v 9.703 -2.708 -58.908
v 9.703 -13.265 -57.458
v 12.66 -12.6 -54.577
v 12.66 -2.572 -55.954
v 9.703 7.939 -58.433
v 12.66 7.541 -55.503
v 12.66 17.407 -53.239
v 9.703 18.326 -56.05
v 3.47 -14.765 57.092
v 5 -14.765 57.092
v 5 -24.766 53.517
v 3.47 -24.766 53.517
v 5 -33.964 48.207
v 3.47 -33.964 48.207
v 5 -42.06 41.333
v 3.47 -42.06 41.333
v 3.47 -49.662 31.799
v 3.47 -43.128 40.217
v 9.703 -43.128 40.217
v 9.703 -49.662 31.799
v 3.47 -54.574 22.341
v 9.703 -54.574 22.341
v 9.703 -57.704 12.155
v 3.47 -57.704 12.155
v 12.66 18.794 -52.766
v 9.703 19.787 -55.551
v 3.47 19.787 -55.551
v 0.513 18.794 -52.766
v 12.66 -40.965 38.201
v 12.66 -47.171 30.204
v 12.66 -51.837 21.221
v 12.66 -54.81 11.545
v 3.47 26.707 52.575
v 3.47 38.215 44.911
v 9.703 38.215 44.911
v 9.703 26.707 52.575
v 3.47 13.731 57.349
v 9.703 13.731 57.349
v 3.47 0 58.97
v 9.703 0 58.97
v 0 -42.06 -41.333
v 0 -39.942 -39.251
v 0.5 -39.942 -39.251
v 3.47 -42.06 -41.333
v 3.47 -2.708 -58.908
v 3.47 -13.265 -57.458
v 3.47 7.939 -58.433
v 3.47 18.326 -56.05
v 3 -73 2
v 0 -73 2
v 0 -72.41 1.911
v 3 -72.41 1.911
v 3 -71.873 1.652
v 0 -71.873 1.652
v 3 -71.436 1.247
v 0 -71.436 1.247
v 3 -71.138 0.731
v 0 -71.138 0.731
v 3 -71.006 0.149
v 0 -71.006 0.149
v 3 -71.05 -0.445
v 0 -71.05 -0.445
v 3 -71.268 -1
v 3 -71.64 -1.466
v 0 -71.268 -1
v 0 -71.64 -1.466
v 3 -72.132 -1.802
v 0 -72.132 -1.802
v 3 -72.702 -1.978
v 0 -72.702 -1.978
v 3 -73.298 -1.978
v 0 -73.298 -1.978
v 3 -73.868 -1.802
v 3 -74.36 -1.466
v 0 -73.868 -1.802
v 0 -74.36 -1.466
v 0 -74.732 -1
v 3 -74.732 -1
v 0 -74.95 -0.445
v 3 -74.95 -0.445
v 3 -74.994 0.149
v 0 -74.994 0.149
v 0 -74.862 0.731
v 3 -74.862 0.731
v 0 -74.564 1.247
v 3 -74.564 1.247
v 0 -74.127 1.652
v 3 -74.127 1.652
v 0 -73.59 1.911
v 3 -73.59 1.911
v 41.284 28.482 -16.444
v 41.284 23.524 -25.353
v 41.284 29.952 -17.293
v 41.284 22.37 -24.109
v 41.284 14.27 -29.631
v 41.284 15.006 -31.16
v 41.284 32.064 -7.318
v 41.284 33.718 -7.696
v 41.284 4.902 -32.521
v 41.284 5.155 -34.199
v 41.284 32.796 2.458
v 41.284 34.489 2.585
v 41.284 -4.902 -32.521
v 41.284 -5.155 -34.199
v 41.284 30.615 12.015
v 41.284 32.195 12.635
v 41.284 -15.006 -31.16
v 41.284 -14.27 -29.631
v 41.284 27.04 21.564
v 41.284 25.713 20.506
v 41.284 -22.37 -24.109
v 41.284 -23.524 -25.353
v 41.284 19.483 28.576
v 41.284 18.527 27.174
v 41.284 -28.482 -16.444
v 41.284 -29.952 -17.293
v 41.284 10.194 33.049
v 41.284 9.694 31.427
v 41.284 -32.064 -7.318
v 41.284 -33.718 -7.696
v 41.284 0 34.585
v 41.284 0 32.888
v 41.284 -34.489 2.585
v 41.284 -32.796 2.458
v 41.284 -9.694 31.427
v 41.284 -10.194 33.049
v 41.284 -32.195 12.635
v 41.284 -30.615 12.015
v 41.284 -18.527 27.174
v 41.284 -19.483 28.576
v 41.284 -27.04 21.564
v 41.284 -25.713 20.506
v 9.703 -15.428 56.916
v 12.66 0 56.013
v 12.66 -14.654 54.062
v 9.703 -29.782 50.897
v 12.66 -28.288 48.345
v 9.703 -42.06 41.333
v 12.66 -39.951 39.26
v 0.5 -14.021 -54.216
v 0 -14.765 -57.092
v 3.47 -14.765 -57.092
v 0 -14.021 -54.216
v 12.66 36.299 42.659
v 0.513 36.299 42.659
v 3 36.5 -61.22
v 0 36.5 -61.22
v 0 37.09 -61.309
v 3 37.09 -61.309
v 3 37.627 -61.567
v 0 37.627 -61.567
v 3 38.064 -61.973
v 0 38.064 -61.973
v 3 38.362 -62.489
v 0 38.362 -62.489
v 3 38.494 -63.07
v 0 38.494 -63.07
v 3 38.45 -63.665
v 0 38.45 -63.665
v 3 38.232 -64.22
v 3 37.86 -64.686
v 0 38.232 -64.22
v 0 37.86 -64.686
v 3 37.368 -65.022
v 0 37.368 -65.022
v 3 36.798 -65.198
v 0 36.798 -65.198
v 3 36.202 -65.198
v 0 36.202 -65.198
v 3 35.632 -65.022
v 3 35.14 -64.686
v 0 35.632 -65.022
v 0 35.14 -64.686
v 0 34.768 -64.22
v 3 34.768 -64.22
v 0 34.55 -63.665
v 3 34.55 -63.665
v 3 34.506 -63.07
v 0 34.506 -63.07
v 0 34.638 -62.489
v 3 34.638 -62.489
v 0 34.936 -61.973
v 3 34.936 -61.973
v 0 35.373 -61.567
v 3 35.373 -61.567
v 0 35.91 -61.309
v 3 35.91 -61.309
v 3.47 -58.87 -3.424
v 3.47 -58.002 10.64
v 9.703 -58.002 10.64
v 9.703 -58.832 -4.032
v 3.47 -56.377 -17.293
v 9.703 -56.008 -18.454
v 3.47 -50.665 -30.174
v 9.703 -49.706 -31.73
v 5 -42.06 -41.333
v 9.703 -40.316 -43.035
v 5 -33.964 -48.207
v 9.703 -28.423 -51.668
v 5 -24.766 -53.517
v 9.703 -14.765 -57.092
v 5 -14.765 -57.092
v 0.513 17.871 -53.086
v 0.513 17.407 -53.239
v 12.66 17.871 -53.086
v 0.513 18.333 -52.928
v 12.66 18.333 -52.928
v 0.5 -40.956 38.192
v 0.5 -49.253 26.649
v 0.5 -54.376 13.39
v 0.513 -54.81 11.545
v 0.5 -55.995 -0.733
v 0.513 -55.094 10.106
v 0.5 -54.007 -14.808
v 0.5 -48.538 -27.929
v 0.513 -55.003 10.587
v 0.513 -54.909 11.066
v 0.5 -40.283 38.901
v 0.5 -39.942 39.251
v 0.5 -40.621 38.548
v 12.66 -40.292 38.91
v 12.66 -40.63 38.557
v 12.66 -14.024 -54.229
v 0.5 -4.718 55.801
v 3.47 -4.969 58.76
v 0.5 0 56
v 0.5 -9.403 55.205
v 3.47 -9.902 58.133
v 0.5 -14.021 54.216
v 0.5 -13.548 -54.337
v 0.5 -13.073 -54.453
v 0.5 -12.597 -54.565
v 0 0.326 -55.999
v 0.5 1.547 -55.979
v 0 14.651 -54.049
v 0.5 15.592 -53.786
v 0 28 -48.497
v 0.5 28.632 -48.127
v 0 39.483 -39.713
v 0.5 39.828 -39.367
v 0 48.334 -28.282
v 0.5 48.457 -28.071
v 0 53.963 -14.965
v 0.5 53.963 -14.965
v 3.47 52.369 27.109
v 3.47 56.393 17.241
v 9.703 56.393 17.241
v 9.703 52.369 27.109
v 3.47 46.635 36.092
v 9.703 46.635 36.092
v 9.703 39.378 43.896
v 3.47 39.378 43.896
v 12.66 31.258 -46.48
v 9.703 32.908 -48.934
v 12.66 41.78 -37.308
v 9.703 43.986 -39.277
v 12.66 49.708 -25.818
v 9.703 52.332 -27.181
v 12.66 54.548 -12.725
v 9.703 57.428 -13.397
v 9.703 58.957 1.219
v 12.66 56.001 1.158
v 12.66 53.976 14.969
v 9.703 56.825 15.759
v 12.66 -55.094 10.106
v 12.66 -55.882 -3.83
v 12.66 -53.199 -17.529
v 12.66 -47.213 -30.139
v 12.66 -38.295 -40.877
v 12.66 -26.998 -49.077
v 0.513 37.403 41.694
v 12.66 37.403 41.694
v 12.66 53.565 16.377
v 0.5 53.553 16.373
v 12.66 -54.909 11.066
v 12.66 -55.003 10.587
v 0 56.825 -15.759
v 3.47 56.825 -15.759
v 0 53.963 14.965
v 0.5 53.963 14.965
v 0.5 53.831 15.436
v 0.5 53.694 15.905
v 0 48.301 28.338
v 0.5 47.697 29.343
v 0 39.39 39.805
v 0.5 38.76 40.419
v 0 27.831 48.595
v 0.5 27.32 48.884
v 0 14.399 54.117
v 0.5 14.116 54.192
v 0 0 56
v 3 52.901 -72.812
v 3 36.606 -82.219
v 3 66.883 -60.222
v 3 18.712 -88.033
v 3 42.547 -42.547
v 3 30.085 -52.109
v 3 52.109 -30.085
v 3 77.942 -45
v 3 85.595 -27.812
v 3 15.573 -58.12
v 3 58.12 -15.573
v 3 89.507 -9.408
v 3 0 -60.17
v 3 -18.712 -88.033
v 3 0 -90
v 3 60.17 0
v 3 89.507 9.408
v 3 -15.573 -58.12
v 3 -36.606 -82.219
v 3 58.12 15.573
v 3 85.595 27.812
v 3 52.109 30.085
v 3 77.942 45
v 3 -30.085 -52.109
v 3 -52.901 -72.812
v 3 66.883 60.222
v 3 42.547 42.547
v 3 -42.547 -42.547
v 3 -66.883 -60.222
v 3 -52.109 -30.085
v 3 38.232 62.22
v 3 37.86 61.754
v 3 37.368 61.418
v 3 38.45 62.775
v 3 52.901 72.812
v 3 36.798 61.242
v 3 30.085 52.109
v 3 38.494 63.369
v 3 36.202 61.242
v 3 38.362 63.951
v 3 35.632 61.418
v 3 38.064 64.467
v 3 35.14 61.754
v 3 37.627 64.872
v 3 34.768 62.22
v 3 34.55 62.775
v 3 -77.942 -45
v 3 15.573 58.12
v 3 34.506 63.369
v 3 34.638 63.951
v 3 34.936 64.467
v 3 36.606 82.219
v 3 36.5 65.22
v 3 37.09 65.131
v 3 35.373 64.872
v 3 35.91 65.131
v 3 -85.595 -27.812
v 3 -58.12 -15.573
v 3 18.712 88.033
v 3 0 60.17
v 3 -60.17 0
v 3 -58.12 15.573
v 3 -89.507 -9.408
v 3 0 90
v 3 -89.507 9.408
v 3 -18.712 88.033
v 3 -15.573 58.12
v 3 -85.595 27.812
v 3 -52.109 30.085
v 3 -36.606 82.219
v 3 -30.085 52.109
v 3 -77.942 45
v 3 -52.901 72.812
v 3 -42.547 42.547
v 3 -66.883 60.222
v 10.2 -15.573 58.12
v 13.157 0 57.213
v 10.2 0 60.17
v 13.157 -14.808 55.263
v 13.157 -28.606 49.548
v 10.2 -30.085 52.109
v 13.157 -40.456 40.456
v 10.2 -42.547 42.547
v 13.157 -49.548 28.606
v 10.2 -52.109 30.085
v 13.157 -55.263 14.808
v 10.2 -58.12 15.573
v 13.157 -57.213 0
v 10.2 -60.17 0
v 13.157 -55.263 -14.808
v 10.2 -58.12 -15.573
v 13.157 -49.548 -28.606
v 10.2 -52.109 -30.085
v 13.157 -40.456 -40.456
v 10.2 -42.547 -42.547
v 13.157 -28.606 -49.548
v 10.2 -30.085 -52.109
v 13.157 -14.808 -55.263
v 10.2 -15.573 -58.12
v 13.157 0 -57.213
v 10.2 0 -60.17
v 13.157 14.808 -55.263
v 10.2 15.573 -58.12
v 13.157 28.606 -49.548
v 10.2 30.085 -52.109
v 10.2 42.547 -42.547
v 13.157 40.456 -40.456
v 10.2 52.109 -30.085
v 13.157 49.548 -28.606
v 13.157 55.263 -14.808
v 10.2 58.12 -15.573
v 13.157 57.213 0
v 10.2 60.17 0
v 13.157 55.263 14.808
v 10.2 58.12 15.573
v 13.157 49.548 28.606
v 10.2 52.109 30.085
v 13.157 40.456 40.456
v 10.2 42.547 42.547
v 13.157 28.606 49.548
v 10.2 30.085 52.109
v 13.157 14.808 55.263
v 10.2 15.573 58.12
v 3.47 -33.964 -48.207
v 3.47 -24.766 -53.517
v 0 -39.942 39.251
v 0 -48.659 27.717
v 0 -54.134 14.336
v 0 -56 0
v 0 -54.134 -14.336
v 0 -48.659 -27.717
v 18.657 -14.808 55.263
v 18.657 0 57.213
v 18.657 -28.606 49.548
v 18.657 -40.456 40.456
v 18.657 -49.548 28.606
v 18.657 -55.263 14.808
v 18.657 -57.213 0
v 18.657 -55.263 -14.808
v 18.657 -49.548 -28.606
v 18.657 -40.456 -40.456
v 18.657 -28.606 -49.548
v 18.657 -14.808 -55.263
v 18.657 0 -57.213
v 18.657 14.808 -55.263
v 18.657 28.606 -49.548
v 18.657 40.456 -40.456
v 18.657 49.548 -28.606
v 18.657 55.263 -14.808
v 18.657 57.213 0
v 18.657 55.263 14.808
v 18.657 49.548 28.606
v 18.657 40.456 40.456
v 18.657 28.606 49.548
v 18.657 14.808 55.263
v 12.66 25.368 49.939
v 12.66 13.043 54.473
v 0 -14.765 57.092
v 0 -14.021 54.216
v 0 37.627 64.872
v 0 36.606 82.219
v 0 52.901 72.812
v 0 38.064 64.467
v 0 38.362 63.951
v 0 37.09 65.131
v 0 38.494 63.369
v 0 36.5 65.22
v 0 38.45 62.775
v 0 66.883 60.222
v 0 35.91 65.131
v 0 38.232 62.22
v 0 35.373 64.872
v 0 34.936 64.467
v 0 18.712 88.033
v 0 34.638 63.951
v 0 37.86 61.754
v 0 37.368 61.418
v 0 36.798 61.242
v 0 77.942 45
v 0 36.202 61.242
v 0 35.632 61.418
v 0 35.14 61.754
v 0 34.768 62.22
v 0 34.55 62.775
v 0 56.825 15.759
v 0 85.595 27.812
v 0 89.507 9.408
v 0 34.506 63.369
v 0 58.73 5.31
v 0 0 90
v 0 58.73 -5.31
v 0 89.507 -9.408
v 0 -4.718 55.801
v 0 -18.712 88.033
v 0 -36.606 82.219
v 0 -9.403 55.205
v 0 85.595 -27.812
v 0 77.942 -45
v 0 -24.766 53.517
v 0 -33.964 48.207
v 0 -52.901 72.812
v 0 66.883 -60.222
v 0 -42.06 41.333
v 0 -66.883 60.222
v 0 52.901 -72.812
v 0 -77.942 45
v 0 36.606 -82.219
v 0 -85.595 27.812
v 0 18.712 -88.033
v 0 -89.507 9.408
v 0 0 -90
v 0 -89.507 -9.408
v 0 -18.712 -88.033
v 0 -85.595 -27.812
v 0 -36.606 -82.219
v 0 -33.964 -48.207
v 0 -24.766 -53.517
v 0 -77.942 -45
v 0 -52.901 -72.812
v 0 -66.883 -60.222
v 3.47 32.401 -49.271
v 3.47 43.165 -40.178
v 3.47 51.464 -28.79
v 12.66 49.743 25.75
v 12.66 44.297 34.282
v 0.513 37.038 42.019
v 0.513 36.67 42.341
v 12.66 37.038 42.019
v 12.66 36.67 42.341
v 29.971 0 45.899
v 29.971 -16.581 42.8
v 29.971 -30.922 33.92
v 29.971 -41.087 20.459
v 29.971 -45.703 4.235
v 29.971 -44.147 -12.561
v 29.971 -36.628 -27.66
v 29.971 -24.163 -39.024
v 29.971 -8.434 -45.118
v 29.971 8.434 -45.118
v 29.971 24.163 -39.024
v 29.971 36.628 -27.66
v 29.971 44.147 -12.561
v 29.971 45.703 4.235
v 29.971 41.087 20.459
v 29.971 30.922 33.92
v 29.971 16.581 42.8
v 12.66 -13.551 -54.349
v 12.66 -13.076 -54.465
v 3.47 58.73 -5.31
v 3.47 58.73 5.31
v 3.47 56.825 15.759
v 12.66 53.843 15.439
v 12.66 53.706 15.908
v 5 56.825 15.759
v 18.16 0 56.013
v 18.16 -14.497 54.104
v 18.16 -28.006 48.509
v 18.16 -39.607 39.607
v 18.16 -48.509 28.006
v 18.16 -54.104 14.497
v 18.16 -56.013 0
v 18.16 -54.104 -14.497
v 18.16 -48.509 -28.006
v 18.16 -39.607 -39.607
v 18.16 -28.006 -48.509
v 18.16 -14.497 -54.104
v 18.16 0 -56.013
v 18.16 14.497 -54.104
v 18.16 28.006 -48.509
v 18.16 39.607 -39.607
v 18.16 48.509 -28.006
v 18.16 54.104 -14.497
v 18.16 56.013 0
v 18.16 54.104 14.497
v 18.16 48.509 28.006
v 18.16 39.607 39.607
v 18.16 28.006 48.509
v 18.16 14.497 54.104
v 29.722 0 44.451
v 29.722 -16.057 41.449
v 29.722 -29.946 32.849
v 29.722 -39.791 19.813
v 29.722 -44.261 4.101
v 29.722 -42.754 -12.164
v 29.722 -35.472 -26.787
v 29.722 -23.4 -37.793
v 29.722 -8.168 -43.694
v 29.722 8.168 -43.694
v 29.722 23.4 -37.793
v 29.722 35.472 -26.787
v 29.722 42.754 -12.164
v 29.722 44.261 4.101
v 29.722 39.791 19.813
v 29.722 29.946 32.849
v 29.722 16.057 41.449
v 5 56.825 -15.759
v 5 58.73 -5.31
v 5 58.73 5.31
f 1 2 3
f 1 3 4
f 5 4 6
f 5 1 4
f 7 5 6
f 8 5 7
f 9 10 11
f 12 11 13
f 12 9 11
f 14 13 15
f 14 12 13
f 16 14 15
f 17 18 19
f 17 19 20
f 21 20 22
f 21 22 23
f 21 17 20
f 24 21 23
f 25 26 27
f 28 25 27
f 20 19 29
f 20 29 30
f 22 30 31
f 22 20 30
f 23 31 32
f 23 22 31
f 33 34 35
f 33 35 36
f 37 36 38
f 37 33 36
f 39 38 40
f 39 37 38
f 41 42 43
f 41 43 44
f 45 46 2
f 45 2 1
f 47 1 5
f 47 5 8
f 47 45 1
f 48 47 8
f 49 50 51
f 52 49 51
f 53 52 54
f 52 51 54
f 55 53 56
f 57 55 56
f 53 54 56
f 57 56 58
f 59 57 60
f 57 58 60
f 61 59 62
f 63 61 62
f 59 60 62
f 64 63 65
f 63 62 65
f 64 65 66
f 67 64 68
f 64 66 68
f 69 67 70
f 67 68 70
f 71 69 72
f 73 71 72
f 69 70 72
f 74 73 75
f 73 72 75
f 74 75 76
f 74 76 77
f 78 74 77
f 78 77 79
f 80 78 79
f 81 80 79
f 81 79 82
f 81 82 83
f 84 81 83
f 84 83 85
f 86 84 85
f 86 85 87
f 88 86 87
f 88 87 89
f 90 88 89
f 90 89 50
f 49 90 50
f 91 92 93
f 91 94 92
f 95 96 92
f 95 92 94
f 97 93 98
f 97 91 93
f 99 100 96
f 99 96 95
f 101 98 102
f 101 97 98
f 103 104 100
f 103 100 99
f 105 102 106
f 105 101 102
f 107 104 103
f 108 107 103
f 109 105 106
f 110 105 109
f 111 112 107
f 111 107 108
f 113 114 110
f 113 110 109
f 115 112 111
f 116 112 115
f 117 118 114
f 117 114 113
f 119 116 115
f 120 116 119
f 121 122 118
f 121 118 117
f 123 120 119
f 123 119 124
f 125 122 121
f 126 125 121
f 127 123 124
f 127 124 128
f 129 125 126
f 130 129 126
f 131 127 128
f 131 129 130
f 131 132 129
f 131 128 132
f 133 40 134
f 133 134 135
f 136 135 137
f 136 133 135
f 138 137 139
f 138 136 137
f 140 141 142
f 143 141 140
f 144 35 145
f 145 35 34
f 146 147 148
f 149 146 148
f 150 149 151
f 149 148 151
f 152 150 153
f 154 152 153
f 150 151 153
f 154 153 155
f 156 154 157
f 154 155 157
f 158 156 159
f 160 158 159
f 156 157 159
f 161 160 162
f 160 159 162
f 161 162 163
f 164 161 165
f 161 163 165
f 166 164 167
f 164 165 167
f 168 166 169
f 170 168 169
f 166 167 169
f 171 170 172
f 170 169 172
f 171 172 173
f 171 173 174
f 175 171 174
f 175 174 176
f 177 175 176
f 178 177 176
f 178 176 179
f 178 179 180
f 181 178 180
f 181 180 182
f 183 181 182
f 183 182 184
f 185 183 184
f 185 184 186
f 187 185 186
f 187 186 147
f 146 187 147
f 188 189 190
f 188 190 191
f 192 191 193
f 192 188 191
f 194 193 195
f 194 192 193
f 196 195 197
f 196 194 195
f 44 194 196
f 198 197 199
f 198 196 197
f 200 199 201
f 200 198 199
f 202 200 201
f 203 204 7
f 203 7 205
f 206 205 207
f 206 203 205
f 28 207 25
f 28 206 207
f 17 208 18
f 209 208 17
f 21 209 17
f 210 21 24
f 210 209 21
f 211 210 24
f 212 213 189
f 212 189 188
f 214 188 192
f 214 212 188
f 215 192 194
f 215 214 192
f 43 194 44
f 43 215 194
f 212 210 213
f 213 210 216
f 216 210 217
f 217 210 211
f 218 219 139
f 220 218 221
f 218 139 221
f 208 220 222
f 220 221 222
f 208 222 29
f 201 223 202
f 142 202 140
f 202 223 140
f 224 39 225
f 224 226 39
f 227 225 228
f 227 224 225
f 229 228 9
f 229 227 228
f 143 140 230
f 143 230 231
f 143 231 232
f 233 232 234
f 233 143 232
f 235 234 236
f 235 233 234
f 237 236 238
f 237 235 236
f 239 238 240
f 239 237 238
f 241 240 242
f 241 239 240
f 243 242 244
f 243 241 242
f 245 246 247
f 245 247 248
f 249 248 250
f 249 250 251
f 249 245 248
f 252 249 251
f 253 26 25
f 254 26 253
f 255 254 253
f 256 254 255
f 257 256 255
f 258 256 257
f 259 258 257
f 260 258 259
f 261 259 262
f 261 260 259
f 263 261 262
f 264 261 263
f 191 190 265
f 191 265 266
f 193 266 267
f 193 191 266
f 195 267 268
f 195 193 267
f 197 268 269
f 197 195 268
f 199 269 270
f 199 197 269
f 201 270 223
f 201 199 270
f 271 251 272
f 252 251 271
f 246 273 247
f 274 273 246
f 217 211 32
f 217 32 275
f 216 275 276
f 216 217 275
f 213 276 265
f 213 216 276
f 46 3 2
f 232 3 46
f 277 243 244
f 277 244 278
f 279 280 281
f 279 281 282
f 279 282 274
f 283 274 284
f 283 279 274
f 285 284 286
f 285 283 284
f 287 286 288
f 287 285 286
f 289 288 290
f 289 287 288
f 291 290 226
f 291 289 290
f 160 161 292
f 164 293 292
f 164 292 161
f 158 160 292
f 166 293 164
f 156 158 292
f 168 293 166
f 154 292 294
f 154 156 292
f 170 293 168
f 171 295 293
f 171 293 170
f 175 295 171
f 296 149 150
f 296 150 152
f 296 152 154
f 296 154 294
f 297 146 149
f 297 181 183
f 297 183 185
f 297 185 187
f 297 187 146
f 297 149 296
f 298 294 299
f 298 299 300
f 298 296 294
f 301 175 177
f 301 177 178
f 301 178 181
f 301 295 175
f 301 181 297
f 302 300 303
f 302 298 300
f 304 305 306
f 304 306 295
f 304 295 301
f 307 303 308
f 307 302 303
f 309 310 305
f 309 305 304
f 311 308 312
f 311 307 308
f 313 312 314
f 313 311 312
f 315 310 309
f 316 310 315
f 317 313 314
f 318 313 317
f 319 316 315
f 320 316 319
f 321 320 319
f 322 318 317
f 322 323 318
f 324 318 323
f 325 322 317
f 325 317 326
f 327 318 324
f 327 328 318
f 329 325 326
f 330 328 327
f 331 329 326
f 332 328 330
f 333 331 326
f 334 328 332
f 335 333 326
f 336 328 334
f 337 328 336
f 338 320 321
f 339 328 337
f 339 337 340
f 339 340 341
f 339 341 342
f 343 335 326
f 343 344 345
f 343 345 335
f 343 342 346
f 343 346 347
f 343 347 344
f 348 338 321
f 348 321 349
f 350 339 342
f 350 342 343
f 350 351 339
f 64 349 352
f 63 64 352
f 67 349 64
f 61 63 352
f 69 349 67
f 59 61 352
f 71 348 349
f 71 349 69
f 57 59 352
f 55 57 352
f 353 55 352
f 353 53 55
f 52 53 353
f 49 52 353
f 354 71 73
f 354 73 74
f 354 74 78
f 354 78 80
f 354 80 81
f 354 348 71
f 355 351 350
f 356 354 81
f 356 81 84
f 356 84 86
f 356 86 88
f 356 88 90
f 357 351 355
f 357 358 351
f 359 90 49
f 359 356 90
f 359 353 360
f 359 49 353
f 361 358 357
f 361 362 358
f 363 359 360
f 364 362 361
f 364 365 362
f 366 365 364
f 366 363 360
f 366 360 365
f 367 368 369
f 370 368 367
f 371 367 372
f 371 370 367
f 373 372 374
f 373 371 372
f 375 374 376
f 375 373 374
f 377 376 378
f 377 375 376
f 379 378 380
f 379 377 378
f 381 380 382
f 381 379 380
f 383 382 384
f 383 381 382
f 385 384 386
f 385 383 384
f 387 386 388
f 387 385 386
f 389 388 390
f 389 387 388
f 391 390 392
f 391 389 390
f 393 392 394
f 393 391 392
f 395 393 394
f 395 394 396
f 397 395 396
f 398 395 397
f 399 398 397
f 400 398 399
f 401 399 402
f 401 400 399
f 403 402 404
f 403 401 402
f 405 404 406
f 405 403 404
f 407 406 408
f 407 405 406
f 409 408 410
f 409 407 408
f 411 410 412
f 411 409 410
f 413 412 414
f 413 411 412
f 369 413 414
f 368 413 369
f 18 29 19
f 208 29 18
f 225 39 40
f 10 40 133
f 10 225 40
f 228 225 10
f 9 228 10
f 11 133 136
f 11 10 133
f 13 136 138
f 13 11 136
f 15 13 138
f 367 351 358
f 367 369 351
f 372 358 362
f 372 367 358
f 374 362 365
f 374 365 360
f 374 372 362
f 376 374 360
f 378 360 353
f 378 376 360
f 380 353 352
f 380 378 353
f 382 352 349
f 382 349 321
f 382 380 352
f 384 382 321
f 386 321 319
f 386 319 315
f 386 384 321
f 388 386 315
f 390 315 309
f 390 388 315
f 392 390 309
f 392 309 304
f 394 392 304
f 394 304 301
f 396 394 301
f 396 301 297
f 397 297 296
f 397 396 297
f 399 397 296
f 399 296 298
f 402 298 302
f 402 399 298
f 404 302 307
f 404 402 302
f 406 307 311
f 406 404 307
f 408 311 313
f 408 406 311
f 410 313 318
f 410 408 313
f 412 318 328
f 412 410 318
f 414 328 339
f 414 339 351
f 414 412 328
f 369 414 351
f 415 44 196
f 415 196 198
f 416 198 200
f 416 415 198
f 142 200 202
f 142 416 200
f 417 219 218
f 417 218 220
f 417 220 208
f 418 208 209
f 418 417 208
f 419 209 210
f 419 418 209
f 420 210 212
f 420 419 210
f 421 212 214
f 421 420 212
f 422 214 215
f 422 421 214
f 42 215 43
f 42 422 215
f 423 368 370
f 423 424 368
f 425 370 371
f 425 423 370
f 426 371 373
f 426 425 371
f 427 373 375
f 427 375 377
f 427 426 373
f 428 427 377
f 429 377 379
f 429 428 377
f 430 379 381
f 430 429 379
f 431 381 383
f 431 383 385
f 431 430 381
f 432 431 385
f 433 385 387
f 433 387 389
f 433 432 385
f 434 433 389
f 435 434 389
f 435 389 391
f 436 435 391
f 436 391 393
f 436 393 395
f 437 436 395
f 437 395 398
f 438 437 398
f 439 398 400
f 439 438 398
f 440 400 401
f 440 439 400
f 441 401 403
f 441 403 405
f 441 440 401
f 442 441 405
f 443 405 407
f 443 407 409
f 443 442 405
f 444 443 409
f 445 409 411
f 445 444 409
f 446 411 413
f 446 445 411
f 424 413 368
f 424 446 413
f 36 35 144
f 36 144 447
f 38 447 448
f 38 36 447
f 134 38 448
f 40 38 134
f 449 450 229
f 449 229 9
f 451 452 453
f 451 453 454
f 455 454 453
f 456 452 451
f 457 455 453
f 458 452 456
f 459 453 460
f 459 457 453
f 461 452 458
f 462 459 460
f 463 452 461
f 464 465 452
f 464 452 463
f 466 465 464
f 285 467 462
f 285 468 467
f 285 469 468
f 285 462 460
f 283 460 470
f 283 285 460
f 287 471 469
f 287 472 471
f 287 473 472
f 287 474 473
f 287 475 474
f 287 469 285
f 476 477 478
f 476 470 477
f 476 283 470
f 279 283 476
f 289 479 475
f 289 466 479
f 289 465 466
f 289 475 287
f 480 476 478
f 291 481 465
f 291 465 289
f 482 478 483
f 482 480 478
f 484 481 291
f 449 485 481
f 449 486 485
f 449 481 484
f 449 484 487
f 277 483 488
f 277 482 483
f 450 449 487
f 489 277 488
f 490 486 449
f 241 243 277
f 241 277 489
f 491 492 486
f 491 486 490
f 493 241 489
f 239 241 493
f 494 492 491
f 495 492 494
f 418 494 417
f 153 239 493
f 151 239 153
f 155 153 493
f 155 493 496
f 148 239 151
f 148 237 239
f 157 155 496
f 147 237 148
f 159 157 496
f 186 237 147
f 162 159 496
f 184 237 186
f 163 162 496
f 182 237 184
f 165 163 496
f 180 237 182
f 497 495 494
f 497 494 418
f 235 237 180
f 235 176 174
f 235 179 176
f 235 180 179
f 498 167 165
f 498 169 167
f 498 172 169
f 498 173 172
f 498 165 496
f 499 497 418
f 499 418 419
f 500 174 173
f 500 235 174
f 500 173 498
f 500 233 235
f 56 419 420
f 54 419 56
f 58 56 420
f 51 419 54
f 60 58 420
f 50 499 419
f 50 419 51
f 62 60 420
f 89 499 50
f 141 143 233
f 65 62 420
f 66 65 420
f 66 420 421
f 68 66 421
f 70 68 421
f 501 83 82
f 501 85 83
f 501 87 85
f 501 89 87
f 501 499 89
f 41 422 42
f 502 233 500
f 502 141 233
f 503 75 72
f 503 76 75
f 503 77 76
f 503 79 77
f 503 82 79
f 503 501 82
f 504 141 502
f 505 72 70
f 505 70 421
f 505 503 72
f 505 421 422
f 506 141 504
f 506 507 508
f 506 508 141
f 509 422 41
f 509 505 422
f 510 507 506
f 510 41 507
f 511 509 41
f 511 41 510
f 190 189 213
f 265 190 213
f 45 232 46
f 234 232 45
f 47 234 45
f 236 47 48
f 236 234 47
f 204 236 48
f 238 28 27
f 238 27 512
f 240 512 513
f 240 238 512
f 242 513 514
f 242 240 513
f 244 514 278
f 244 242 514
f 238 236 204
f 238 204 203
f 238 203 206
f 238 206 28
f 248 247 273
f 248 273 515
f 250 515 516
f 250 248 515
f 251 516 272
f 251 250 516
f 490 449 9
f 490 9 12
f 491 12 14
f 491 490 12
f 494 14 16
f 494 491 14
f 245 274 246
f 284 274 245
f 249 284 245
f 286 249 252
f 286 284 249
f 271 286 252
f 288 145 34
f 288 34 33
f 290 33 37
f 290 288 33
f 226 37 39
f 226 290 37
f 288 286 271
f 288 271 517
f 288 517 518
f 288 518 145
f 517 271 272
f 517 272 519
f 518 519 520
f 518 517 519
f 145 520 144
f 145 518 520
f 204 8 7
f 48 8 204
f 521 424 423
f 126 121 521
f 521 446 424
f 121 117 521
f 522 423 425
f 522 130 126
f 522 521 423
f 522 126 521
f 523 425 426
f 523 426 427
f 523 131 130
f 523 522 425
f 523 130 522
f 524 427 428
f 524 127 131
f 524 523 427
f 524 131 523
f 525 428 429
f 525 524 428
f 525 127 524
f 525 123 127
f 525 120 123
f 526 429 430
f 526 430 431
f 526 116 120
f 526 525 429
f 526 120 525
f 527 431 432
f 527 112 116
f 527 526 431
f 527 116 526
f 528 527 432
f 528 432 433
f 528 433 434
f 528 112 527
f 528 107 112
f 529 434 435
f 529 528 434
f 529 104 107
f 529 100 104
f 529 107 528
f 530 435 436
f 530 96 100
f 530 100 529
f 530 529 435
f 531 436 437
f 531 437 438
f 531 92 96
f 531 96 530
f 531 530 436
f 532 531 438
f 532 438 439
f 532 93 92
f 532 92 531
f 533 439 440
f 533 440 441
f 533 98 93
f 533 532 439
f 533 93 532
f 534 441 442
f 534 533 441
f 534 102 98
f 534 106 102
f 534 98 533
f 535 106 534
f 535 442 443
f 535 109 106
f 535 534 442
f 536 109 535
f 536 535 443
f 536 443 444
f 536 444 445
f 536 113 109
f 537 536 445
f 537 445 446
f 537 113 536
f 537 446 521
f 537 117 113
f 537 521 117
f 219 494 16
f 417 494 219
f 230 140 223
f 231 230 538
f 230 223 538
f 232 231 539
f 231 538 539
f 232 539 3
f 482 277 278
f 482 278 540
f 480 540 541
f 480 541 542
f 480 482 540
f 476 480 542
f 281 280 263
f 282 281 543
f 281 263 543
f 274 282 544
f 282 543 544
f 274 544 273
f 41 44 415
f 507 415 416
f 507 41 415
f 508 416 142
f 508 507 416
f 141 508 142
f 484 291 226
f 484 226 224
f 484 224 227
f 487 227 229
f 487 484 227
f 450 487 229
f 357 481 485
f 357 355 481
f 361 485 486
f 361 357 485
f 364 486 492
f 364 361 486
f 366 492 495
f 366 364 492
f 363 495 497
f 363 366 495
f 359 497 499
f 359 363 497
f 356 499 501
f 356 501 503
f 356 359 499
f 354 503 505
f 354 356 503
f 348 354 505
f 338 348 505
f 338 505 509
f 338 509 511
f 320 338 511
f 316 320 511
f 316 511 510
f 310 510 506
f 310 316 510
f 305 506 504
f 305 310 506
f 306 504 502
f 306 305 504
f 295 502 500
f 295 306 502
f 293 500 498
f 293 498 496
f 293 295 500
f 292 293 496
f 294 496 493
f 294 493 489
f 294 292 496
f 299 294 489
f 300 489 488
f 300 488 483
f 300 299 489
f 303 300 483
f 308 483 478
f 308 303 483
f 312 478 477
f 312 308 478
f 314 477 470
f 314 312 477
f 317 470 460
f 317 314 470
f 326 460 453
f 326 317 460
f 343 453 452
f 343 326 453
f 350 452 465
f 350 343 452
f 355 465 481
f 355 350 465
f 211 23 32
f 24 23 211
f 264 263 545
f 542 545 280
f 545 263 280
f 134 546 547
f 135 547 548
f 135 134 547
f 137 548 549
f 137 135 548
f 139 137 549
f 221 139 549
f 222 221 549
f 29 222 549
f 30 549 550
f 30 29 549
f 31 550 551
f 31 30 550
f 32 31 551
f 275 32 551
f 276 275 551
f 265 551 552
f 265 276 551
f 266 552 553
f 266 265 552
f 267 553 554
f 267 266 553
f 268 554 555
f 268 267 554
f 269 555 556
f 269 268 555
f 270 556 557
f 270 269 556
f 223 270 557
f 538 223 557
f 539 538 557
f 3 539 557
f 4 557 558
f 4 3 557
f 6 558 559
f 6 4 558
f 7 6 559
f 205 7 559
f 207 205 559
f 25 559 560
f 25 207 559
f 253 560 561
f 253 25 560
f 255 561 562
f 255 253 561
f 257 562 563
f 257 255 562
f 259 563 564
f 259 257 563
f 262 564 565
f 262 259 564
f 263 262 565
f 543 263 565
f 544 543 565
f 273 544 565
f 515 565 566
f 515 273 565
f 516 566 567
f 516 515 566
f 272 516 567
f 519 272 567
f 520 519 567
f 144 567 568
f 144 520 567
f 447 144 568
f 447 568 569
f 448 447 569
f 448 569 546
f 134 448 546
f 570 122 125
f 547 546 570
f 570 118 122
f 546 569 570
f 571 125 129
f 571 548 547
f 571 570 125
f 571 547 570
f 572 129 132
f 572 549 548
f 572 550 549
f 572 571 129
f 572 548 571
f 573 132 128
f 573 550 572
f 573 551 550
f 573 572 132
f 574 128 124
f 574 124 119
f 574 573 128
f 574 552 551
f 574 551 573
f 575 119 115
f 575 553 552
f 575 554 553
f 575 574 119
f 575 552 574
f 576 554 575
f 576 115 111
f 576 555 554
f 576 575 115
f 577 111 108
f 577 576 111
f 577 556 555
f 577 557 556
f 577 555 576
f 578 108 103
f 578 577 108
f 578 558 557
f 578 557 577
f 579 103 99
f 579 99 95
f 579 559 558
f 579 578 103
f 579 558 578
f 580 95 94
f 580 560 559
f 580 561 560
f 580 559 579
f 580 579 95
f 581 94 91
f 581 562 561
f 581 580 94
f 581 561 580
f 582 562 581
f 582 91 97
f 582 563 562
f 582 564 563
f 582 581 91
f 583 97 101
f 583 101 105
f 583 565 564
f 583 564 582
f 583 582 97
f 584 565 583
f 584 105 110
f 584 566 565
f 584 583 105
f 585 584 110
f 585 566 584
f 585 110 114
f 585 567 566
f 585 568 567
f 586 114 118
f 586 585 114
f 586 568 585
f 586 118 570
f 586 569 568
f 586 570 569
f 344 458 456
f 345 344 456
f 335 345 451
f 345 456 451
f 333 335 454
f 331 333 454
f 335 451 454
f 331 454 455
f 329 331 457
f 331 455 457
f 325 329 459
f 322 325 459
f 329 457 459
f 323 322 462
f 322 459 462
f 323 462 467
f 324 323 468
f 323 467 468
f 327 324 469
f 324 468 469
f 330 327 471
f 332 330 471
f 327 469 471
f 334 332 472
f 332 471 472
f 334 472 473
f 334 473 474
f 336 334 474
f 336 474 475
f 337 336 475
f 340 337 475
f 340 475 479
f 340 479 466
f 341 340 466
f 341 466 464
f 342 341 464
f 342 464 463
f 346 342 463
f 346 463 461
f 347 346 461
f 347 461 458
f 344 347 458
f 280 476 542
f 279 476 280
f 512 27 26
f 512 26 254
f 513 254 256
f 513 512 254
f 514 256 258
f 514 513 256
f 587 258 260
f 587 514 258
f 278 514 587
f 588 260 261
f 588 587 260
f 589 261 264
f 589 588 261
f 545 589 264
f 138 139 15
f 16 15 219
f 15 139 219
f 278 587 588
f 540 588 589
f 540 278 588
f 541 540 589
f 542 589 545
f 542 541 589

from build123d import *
from build123d.topology import SkipClean

# Parameters (mm, degrees)
CROQUIS2_R            = 2
CORTAR_EXTRUIR1_DEPTH = 5
REVOLUCI_N2_ANGLE     = 1.5
REVOLUCI_N3_ANGLE     = 1.5
MATRIZC1_COUNT        = 3


with BuildPart() as part:
    # Croquis1 → Revolución1 (revolve)
    with BuildSketch(Plane.XY):
        Polygon((0, 56), (0, 90), (3.000002354, 90), (3.000002354, 60.169848481), (10.200002354, 60.169848481), (13.157056275, 57.212794561), (18.657056275, 57.212794561), (41.284473273, 34.585377563), (41.284473273, 32.888321288), (18.16, 56.012794561), (12.66, 56.012794561), (9.70294608, 58.969848481), (3.469848481, 58.969848481), (0.5, 56), align=None)
    revolve(axis=Axis((-46.033893017, 0, 0), (1, 0, 0)))

    # Croquis2 → Cortar-Extruir1 (cut)
    with SkipClean():  # the faces are left unmerged after this step: merging them gives an invalid solid
        with BuildSketch(Plane.ZY):
            with Locations((63.219854476, 36.5)):
                Circle(CROQUIS2_R)
            with Locations((0, -73)):
                Circle(CROQUIS2_R)
            with Locations((-63.219854476, 36.5)):
                Circle(CROQUIS2_R)
            with BuildLine():
                Line((-14.422814665, 52.006989551), (-15.759006546, 56.825141817))
                ThreePointArc((-15.759006546, 56.825141817), (0, 58.969848481), (15.759006546, 56.825141817))
                Line((15.759006546, 56.825141817), (14.422814665, 52.006989551))
                ThreePointArc((14.422814665, 52.006989551), (0, 53.969848481), (-14.422814665, 52.006989551))
            make_face()
            with BuildLine():
                Line((52.250781458, -13.512970881), (57.09151966, -14.764870902))
                ThreePointArc((57.09151966, -14.764870902), (51.069386842, -29.48492424), (41.332513115, -42.060270916))
                Line((41.332513115, -42.060270916), (37.827966793, -38.49401867))
                ThreePointArc((37.827966793, -38.49401867), (46.739259823, -26.98492424), (52.250781458, -13.512970881))
            make_face()
            with BuildLine():
                Line((-37.827966793, -38.49401867), (-41.332513115, -42.060270916))
                ThreePointArc((-41.332513115, -42.060270916), (-51.069386842, -29.48492424), (-57.09151966, -14.764870902))
                Line((-57.09151966, -14.764870902), (-52.250781458, -13.512970881))
                ThreePointArc((-52.250781458, -13.512970881), (-46.739259823, -26.98492424), (-37.827966793, -38.49401867))
            make_face()
        extrude(amount=-CORTAR_EXTRUIR1_DEPTH, mode=Mode.SUBTRACT)

    # Croquis3 → Revolución2 (revolve)
    with SkipClean():  # the faces are left unmerged after this step: merging them gives an invalid solid
        with BuildSketch(Plane(origin=(0, 0, 0), x_dir=(1, 0, 0), z_dir=(0, -0.9681476403781081, 0.2503800040544404))):
            Polygon((0.5, -56), (12.66, -56.012794561), (9.70294608, -58.969848481), (3.469848481, -58.969848481), align=None)
        revoluci_n2 = revolve(axis=Axis((9.70294608, 0, 0), (1, 0, 0)), revolution_arc=REVOLUCI_N2_ANGLE)

    # Croquis5 → Revolución3 (revolve)
    with SkipClean():  # the faces are left unmerged after this step: merging them gives an invalid solid
        with BuildSketch(Plane(origin=(0, 0, 0), x_dir=(-1, 0, 0), z_dir=(0, -0.9504873560590977, -0.31076323137042167))):
            Polygon((-0.5, 56.012794561), (-3.469848481, 58.969848481), (-9.70294608, 58.969848481), (-12.66, 56.012794561), align=None)
        revoluci_n3 = revolve(axis=Axis((9.70294608, 0, 0), (1, 0, 0)), revolution_arc=REVOLUCI_N3_ANGLE)

    # MatrizC1: Revolución2, Revolución3 ×3 about axis
    matrizc1_axis = Axis((9.70294608, 0, 0), (-1, 0, 0))
    add([revoluci_n2.rotate(matrizc1_axis, i * 360 / MATRIZC1_COUNT) for i in range(1, MATRIZC1_COUNT)])
    add([revoluci_n3.rotate(matrizc1_axis, i * 360 / MATRIZC1_COUNT) for i in range(1, MATRIZC1_COUNT)])


solid = part.part
